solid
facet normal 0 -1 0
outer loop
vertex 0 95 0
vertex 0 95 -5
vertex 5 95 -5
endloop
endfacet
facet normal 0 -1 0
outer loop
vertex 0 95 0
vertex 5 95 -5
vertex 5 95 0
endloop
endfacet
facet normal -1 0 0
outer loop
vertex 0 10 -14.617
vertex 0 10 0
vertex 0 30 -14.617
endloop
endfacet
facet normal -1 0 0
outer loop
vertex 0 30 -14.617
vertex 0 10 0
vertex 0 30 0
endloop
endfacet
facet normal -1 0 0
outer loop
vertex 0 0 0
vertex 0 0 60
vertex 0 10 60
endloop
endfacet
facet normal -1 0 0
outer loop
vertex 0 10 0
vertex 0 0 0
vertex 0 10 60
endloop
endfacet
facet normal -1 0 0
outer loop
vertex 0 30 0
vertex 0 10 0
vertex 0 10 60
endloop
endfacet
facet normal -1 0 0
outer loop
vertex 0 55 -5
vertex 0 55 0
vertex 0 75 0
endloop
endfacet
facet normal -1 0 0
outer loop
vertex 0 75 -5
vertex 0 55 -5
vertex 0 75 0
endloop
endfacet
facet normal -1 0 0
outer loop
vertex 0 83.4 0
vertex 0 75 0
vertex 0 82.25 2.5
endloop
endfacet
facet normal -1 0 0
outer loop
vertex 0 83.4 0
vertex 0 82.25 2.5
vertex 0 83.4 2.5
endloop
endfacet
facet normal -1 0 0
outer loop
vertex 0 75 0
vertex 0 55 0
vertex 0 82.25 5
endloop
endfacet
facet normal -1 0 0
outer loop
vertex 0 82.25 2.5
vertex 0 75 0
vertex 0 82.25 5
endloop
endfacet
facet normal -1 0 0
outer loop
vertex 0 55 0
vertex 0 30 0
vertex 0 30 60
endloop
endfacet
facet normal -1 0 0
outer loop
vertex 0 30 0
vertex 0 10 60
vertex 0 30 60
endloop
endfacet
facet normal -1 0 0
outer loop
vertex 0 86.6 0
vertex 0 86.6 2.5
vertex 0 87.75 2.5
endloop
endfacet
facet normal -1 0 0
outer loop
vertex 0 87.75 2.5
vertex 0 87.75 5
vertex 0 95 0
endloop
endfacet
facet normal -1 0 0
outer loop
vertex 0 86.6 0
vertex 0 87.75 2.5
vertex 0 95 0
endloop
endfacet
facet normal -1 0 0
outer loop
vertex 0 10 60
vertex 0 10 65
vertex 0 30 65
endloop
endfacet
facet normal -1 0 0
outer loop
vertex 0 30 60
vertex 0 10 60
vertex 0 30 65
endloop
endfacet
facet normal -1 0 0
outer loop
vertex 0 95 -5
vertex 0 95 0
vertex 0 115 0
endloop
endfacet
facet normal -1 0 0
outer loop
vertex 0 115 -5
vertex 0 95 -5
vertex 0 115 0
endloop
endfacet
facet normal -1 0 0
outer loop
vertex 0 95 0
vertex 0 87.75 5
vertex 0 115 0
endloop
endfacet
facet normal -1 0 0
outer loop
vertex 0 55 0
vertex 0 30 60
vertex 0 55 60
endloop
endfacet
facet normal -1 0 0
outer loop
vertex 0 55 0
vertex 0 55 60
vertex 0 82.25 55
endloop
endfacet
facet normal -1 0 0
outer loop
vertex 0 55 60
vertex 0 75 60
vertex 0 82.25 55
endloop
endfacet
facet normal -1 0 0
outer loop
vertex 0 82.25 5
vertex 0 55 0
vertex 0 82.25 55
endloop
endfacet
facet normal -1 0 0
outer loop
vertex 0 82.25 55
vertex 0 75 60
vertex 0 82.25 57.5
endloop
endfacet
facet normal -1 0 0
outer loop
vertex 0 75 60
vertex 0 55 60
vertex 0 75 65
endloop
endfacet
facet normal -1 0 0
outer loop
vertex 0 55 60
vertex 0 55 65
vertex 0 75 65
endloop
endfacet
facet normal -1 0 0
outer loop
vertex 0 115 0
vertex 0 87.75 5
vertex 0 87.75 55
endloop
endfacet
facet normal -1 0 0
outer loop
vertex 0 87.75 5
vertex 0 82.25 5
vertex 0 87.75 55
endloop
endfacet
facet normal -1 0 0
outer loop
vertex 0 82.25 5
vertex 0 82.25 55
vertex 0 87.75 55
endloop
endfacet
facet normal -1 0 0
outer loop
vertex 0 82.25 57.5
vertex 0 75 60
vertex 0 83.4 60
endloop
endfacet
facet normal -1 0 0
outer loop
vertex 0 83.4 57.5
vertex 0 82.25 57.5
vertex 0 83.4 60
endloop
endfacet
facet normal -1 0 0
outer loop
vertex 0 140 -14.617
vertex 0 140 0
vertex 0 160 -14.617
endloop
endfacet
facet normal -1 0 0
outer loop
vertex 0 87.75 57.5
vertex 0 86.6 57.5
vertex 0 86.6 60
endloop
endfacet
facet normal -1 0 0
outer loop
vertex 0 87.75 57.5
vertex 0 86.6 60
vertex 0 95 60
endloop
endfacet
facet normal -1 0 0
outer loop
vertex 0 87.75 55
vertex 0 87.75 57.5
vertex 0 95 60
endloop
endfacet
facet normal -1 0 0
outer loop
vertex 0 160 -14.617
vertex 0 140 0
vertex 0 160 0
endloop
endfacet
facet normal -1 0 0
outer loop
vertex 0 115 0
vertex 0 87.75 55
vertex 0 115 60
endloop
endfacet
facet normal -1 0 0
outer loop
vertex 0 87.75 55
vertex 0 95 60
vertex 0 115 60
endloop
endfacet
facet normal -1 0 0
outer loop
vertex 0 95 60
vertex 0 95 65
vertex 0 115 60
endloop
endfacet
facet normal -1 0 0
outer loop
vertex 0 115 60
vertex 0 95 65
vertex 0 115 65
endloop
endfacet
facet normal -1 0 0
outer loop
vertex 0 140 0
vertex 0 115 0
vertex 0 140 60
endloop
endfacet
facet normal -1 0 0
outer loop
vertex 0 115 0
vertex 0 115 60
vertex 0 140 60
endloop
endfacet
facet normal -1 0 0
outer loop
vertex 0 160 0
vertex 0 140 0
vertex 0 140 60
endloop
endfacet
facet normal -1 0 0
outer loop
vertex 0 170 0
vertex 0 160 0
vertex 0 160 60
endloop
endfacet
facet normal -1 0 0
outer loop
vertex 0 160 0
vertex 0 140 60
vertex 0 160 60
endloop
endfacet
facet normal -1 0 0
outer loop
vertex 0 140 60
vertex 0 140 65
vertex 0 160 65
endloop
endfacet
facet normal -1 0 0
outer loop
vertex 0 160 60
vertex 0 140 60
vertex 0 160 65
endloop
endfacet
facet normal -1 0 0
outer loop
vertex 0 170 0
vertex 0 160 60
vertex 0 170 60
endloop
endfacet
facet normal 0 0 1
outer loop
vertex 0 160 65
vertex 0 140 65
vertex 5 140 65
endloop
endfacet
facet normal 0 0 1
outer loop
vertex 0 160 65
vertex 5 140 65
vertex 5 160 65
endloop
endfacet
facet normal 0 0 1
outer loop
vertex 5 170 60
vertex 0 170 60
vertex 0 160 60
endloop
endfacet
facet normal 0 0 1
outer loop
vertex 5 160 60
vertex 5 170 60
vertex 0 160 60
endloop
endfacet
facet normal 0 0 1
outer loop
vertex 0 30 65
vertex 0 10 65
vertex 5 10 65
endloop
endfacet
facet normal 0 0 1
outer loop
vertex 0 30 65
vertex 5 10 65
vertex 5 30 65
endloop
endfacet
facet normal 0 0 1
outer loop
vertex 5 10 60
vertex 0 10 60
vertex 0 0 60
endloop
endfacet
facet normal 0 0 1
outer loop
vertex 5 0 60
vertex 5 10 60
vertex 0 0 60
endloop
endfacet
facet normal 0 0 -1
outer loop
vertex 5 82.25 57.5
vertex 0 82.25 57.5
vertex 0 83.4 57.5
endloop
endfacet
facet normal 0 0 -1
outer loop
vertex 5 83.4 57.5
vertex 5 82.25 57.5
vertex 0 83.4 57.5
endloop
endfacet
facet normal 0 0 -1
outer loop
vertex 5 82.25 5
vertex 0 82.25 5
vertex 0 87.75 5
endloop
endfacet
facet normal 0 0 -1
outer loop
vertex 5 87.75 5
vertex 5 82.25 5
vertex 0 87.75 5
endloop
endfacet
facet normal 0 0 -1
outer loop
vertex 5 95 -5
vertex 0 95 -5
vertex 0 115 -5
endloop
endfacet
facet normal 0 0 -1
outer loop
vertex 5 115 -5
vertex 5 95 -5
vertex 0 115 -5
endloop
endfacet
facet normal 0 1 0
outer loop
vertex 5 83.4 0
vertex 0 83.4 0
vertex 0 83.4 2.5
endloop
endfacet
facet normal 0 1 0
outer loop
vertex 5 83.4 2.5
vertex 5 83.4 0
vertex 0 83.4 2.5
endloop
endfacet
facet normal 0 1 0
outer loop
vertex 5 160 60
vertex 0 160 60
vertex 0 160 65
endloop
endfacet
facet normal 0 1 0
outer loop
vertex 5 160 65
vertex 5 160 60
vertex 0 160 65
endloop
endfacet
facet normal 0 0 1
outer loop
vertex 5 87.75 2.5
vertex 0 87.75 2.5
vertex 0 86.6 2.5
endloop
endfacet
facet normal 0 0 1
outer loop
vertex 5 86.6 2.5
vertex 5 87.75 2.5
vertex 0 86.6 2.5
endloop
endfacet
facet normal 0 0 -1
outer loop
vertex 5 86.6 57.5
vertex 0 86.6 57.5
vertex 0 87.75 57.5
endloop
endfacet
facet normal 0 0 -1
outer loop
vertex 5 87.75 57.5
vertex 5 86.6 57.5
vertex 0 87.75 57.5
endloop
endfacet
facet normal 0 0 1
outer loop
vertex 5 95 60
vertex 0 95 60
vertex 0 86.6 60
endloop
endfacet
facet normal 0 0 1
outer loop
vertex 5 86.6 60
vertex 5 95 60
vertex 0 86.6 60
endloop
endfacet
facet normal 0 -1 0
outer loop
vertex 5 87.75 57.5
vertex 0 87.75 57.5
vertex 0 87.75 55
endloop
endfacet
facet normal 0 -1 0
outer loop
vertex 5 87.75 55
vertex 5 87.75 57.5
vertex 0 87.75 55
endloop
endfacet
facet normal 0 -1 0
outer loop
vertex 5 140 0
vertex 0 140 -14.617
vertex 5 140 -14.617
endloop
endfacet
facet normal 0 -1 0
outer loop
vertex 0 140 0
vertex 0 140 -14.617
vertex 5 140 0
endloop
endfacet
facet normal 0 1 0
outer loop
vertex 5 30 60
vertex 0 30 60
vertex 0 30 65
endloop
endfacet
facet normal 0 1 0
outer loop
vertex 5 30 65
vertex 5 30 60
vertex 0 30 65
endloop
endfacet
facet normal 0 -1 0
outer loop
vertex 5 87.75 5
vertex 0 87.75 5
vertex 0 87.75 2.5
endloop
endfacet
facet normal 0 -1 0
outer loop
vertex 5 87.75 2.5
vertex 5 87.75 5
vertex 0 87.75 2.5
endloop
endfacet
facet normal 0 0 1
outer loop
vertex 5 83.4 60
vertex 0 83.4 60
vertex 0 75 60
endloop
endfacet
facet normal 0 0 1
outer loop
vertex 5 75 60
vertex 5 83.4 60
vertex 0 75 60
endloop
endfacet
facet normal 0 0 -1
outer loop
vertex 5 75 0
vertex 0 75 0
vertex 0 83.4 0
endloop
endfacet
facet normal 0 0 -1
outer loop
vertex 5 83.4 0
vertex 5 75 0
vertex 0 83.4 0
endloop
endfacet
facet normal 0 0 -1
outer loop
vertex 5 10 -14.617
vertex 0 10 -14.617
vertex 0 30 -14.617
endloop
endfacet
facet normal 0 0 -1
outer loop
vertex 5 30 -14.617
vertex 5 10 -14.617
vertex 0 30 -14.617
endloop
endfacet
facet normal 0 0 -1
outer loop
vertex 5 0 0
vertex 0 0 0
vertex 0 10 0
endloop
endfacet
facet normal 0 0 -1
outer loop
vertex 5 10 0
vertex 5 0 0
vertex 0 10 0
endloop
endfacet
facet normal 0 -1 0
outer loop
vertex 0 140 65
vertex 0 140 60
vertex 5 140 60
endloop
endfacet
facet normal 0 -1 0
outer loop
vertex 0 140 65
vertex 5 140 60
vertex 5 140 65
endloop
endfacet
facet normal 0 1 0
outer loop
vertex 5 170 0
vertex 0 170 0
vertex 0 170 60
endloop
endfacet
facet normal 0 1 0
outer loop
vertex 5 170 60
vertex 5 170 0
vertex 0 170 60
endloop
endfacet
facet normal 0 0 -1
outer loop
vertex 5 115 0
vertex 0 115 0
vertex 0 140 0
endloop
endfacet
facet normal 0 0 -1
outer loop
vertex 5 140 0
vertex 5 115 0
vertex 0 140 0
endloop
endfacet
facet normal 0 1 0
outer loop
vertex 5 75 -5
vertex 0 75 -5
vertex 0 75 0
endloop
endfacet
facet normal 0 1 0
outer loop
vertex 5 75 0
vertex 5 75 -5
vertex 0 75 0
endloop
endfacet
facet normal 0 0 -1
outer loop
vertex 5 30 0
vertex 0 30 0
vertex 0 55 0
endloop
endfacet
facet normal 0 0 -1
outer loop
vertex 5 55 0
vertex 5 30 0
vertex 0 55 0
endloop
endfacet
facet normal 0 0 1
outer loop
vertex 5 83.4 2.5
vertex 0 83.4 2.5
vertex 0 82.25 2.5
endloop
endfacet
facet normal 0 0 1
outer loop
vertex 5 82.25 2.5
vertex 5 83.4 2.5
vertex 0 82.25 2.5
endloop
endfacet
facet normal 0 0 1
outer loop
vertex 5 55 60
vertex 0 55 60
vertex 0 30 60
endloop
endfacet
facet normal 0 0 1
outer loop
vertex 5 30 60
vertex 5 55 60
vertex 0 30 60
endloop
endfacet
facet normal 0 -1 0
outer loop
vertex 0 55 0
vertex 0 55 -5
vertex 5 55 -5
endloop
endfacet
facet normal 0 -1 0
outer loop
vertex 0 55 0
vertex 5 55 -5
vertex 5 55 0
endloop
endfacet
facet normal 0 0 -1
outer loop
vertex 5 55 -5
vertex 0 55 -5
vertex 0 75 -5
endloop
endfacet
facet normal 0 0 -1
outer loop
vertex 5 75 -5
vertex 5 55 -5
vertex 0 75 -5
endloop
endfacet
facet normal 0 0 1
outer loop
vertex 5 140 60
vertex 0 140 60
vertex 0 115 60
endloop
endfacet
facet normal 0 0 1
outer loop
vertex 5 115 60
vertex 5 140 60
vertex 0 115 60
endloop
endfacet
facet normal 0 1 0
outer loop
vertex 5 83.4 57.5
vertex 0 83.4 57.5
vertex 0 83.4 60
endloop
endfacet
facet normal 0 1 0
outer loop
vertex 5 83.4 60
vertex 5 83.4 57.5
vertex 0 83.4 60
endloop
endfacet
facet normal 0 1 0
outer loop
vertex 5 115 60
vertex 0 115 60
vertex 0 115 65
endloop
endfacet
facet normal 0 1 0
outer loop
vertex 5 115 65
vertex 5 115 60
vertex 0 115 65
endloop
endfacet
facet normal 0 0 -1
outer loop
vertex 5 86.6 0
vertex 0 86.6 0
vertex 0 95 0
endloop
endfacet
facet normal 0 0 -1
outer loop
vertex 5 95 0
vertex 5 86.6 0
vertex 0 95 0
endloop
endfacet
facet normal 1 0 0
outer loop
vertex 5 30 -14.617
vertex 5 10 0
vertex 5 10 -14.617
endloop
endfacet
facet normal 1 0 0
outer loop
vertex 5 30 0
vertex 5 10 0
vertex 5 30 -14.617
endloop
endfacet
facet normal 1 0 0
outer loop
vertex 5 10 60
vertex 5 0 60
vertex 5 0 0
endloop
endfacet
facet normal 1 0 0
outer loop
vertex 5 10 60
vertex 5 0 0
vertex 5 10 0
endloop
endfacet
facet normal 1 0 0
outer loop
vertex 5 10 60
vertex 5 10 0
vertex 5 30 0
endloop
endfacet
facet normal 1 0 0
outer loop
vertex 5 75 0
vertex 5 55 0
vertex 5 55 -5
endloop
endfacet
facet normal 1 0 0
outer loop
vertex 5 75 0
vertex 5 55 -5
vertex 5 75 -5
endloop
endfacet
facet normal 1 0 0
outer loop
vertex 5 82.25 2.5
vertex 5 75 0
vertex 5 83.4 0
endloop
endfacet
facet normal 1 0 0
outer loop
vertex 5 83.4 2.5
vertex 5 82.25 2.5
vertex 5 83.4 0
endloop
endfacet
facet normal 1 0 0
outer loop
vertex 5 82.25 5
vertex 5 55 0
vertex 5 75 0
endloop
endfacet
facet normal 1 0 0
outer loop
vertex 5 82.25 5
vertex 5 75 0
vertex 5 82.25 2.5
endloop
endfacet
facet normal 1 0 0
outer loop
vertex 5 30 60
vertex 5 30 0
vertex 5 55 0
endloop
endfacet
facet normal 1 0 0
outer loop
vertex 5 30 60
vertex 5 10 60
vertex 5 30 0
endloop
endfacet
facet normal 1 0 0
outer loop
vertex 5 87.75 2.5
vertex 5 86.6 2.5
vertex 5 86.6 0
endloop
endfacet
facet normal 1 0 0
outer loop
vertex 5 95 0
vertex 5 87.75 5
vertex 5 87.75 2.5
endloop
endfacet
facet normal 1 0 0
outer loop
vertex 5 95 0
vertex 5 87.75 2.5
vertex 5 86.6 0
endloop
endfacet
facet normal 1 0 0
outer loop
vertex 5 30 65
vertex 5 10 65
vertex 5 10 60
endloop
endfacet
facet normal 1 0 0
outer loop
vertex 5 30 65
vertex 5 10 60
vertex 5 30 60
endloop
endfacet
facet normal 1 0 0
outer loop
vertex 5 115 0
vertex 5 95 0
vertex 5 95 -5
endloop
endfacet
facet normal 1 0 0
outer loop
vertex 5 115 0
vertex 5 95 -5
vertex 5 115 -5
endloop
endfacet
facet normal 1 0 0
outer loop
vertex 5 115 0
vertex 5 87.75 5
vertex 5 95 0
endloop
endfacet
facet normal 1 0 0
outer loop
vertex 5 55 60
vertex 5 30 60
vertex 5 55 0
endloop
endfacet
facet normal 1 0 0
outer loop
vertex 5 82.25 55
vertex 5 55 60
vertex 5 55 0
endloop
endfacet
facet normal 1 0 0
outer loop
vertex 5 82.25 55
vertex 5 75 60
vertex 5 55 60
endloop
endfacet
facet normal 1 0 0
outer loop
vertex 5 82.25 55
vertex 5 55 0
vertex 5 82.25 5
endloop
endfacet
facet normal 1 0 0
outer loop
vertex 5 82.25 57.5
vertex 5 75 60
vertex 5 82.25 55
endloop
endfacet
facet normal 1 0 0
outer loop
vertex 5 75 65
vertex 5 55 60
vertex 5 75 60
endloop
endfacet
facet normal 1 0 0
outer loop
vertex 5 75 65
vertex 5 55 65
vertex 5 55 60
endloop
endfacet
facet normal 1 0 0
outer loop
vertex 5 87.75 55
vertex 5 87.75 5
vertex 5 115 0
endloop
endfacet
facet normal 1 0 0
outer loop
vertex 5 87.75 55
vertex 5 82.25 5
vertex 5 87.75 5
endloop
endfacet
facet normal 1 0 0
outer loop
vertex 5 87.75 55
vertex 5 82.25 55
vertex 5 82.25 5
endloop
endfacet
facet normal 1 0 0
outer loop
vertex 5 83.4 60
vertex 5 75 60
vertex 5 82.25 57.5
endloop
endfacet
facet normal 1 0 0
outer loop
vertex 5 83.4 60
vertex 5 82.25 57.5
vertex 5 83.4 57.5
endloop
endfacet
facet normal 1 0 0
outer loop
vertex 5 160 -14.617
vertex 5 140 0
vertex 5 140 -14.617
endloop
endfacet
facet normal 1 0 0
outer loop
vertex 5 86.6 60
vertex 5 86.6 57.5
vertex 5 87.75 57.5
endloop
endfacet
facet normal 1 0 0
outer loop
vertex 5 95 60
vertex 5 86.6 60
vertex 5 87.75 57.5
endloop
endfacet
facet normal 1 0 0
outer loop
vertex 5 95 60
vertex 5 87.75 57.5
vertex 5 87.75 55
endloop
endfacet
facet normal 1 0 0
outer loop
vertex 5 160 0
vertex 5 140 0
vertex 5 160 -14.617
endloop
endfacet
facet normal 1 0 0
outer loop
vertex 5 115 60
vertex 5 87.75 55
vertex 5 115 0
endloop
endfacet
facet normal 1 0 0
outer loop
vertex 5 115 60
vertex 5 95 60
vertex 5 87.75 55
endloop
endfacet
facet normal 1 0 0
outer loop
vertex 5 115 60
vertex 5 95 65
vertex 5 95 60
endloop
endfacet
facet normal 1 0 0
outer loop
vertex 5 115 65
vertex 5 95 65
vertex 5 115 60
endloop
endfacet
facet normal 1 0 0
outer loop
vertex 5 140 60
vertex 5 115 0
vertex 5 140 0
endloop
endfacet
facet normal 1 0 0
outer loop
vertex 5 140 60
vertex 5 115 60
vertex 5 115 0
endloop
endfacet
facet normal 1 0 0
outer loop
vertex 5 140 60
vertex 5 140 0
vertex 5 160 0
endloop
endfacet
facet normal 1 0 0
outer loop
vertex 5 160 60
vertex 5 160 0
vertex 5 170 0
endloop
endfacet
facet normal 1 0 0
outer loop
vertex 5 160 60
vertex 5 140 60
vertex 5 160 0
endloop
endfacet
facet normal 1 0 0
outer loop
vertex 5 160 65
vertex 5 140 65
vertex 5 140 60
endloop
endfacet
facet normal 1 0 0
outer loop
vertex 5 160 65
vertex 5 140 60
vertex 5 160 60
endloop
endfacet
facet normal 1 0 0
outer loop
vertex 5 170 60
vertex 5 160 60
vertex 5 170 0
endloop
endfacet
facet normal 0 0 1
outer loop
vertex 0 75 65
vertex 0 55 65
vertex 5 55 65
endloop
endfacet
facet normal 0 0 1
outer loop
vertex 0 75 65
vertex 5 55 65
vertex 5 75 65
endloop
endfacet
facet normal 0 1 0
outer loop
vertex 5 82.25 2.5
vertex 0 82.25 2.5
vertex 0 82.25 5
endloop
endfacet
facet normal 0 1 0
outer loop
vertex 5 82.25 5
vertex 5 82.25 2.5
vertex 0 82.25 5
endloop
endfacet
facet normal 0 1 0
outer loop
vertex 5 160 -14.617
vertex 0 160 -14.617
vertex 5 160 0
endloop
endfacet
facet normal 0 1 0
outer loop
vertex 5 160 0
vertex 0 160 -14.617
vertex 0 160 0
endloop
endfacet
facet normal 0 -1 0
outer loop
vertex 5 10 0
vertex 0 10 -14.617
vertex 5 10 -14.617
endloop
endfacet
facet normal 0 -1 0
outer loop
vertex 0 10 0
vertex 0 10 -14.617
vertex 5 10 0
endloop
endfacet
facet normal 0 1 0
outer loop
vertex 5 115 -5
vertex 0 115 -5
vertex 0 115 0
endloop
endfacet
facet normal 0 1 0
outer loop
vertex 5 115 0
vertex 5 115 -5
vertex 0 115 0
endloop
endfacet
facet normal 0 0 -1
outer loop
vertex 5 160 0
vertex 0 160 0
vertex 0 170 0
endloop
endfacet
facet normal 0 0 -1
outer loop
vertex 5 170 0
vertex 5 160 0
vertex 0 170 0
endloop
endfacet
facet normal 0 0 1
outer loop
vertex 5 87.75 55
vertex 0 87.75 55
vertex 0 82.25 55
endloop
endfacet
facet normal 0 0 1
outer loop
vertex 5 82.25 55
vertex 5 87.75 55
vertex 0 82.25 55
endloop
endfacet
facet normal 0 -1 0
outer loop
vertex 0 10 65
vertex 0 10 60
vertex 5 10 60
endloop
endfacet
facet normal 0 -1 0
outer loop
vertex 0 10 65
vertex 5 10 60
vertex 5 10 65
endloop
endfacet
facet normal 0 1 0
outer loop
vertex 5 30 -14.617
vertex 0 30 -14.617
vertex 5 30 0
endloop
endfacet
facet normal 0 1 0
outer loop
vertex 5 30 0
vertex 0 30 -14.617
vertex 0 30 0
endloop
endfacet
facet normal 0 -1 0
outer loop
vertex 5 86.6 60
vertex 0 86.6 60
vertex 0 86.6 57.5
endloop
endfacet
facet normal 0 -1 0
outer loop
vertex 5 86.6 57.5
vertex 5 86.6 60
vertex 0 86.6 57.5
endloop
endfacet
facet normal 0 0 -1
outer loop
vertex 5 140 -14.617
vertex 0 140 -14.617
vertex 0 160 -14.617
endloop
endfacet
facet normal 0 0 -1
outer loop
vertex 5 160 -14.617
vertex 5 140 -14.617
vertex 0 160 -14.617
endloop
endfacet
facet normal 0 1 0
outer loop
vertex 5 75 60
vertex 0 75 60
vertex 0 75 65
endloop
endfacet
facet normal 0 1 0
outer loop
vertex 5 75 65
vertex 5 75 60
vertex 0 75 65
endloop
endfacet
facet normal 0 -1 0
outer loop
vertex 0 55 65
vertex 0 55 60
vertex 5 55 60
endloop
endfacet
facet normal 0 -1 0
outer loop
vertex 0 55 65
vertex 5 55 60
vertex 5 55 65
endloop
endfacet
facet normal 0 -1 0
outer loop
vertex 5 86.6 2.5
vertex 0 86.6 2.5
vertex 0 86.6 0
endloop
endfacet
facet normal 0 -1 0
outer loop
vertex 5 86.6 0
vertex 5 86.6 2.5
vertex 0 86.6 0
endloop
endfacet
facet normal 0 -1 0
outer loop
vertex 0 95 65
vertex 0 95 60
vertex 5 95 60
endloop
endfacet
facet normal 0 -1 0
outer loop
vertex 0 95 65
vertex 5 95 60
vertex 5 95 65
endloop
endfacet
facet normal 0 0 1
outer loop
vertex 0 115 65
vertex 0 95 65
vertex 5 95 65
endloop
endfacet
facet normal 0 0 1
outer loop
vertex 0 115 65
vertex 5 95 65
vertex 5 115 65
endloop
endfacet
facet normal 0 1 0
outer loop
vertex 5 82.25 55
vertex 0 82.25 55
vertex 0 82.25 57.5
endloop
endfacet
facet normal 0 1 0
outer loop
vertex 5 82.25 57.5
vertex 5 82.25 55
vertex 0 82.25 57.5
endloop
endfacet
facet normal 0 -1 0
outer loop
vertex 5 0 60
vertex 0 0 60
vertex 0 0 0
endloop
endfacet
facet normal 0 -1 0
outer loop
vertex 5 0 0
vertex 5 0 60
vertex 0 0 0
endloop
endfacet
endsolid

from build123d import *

# Parameters (mm, degrees)
F1_W     = 20
F1_H     = 14.6167501807
F1_H_2   = 5
F2_DEPTH = 5


with BuildPart() as f2:
    # F1 (on Right) → F2 (new body)
    with BuildSketch(Plane.YZ):
        Polygon((0, 60), (0, 0), (10, 0), (30, 0), (55, 0), (75, 0), (83.4, 0), (83.4, 2.5), (82.25, 2.5), (82.25, 5), (85, 5), (87.75, 5), (87.75, 2.5), (86.6, 2.5), (86.6, 0), (95, 0), (115, 0), (140, 0), (160, 0), (170, 0), (170, 60), (160, 60), (140, 60), (115, 60), (95, 60), (86.6, 60), (86.6, 57.5), (87.75, 57.5), (87.75, 55), (85, 55), (82.25, 55), (82.25, 57.5), (83.4, 57.5), (83.4, 60), (75, 60), (55, 60), (30, 60), (10, 60), align=None)
        with Locations((20, -7.3083750904)):
            Rectangle(F1_W, F1_H)
        with Locations((20, 62.5)):
            Rectangle(F1_W, F1_H_2)
        with Locations((65, -2.5)):
            Rectangle(F1_W, F1_H_2)
        with Locations((65, 62.5)):
            Rectangle(F1_W, F1_H_2)
        with Locations((105, -2.5)):
            Rectangle(F1_W, F1_H_2)
        with Locations((105, 62.5)):
            Rectangle(F1_W, F1_H_2)
        with Locations((150, -7.3083750904)):
            Rectangle(F1_W, F1_H)
        with Locations((150, 62.5)):
            Rectangle(F1_W, F1_H_2)
    extrude(amount=F2_DEPTH)


solid = f2.part
